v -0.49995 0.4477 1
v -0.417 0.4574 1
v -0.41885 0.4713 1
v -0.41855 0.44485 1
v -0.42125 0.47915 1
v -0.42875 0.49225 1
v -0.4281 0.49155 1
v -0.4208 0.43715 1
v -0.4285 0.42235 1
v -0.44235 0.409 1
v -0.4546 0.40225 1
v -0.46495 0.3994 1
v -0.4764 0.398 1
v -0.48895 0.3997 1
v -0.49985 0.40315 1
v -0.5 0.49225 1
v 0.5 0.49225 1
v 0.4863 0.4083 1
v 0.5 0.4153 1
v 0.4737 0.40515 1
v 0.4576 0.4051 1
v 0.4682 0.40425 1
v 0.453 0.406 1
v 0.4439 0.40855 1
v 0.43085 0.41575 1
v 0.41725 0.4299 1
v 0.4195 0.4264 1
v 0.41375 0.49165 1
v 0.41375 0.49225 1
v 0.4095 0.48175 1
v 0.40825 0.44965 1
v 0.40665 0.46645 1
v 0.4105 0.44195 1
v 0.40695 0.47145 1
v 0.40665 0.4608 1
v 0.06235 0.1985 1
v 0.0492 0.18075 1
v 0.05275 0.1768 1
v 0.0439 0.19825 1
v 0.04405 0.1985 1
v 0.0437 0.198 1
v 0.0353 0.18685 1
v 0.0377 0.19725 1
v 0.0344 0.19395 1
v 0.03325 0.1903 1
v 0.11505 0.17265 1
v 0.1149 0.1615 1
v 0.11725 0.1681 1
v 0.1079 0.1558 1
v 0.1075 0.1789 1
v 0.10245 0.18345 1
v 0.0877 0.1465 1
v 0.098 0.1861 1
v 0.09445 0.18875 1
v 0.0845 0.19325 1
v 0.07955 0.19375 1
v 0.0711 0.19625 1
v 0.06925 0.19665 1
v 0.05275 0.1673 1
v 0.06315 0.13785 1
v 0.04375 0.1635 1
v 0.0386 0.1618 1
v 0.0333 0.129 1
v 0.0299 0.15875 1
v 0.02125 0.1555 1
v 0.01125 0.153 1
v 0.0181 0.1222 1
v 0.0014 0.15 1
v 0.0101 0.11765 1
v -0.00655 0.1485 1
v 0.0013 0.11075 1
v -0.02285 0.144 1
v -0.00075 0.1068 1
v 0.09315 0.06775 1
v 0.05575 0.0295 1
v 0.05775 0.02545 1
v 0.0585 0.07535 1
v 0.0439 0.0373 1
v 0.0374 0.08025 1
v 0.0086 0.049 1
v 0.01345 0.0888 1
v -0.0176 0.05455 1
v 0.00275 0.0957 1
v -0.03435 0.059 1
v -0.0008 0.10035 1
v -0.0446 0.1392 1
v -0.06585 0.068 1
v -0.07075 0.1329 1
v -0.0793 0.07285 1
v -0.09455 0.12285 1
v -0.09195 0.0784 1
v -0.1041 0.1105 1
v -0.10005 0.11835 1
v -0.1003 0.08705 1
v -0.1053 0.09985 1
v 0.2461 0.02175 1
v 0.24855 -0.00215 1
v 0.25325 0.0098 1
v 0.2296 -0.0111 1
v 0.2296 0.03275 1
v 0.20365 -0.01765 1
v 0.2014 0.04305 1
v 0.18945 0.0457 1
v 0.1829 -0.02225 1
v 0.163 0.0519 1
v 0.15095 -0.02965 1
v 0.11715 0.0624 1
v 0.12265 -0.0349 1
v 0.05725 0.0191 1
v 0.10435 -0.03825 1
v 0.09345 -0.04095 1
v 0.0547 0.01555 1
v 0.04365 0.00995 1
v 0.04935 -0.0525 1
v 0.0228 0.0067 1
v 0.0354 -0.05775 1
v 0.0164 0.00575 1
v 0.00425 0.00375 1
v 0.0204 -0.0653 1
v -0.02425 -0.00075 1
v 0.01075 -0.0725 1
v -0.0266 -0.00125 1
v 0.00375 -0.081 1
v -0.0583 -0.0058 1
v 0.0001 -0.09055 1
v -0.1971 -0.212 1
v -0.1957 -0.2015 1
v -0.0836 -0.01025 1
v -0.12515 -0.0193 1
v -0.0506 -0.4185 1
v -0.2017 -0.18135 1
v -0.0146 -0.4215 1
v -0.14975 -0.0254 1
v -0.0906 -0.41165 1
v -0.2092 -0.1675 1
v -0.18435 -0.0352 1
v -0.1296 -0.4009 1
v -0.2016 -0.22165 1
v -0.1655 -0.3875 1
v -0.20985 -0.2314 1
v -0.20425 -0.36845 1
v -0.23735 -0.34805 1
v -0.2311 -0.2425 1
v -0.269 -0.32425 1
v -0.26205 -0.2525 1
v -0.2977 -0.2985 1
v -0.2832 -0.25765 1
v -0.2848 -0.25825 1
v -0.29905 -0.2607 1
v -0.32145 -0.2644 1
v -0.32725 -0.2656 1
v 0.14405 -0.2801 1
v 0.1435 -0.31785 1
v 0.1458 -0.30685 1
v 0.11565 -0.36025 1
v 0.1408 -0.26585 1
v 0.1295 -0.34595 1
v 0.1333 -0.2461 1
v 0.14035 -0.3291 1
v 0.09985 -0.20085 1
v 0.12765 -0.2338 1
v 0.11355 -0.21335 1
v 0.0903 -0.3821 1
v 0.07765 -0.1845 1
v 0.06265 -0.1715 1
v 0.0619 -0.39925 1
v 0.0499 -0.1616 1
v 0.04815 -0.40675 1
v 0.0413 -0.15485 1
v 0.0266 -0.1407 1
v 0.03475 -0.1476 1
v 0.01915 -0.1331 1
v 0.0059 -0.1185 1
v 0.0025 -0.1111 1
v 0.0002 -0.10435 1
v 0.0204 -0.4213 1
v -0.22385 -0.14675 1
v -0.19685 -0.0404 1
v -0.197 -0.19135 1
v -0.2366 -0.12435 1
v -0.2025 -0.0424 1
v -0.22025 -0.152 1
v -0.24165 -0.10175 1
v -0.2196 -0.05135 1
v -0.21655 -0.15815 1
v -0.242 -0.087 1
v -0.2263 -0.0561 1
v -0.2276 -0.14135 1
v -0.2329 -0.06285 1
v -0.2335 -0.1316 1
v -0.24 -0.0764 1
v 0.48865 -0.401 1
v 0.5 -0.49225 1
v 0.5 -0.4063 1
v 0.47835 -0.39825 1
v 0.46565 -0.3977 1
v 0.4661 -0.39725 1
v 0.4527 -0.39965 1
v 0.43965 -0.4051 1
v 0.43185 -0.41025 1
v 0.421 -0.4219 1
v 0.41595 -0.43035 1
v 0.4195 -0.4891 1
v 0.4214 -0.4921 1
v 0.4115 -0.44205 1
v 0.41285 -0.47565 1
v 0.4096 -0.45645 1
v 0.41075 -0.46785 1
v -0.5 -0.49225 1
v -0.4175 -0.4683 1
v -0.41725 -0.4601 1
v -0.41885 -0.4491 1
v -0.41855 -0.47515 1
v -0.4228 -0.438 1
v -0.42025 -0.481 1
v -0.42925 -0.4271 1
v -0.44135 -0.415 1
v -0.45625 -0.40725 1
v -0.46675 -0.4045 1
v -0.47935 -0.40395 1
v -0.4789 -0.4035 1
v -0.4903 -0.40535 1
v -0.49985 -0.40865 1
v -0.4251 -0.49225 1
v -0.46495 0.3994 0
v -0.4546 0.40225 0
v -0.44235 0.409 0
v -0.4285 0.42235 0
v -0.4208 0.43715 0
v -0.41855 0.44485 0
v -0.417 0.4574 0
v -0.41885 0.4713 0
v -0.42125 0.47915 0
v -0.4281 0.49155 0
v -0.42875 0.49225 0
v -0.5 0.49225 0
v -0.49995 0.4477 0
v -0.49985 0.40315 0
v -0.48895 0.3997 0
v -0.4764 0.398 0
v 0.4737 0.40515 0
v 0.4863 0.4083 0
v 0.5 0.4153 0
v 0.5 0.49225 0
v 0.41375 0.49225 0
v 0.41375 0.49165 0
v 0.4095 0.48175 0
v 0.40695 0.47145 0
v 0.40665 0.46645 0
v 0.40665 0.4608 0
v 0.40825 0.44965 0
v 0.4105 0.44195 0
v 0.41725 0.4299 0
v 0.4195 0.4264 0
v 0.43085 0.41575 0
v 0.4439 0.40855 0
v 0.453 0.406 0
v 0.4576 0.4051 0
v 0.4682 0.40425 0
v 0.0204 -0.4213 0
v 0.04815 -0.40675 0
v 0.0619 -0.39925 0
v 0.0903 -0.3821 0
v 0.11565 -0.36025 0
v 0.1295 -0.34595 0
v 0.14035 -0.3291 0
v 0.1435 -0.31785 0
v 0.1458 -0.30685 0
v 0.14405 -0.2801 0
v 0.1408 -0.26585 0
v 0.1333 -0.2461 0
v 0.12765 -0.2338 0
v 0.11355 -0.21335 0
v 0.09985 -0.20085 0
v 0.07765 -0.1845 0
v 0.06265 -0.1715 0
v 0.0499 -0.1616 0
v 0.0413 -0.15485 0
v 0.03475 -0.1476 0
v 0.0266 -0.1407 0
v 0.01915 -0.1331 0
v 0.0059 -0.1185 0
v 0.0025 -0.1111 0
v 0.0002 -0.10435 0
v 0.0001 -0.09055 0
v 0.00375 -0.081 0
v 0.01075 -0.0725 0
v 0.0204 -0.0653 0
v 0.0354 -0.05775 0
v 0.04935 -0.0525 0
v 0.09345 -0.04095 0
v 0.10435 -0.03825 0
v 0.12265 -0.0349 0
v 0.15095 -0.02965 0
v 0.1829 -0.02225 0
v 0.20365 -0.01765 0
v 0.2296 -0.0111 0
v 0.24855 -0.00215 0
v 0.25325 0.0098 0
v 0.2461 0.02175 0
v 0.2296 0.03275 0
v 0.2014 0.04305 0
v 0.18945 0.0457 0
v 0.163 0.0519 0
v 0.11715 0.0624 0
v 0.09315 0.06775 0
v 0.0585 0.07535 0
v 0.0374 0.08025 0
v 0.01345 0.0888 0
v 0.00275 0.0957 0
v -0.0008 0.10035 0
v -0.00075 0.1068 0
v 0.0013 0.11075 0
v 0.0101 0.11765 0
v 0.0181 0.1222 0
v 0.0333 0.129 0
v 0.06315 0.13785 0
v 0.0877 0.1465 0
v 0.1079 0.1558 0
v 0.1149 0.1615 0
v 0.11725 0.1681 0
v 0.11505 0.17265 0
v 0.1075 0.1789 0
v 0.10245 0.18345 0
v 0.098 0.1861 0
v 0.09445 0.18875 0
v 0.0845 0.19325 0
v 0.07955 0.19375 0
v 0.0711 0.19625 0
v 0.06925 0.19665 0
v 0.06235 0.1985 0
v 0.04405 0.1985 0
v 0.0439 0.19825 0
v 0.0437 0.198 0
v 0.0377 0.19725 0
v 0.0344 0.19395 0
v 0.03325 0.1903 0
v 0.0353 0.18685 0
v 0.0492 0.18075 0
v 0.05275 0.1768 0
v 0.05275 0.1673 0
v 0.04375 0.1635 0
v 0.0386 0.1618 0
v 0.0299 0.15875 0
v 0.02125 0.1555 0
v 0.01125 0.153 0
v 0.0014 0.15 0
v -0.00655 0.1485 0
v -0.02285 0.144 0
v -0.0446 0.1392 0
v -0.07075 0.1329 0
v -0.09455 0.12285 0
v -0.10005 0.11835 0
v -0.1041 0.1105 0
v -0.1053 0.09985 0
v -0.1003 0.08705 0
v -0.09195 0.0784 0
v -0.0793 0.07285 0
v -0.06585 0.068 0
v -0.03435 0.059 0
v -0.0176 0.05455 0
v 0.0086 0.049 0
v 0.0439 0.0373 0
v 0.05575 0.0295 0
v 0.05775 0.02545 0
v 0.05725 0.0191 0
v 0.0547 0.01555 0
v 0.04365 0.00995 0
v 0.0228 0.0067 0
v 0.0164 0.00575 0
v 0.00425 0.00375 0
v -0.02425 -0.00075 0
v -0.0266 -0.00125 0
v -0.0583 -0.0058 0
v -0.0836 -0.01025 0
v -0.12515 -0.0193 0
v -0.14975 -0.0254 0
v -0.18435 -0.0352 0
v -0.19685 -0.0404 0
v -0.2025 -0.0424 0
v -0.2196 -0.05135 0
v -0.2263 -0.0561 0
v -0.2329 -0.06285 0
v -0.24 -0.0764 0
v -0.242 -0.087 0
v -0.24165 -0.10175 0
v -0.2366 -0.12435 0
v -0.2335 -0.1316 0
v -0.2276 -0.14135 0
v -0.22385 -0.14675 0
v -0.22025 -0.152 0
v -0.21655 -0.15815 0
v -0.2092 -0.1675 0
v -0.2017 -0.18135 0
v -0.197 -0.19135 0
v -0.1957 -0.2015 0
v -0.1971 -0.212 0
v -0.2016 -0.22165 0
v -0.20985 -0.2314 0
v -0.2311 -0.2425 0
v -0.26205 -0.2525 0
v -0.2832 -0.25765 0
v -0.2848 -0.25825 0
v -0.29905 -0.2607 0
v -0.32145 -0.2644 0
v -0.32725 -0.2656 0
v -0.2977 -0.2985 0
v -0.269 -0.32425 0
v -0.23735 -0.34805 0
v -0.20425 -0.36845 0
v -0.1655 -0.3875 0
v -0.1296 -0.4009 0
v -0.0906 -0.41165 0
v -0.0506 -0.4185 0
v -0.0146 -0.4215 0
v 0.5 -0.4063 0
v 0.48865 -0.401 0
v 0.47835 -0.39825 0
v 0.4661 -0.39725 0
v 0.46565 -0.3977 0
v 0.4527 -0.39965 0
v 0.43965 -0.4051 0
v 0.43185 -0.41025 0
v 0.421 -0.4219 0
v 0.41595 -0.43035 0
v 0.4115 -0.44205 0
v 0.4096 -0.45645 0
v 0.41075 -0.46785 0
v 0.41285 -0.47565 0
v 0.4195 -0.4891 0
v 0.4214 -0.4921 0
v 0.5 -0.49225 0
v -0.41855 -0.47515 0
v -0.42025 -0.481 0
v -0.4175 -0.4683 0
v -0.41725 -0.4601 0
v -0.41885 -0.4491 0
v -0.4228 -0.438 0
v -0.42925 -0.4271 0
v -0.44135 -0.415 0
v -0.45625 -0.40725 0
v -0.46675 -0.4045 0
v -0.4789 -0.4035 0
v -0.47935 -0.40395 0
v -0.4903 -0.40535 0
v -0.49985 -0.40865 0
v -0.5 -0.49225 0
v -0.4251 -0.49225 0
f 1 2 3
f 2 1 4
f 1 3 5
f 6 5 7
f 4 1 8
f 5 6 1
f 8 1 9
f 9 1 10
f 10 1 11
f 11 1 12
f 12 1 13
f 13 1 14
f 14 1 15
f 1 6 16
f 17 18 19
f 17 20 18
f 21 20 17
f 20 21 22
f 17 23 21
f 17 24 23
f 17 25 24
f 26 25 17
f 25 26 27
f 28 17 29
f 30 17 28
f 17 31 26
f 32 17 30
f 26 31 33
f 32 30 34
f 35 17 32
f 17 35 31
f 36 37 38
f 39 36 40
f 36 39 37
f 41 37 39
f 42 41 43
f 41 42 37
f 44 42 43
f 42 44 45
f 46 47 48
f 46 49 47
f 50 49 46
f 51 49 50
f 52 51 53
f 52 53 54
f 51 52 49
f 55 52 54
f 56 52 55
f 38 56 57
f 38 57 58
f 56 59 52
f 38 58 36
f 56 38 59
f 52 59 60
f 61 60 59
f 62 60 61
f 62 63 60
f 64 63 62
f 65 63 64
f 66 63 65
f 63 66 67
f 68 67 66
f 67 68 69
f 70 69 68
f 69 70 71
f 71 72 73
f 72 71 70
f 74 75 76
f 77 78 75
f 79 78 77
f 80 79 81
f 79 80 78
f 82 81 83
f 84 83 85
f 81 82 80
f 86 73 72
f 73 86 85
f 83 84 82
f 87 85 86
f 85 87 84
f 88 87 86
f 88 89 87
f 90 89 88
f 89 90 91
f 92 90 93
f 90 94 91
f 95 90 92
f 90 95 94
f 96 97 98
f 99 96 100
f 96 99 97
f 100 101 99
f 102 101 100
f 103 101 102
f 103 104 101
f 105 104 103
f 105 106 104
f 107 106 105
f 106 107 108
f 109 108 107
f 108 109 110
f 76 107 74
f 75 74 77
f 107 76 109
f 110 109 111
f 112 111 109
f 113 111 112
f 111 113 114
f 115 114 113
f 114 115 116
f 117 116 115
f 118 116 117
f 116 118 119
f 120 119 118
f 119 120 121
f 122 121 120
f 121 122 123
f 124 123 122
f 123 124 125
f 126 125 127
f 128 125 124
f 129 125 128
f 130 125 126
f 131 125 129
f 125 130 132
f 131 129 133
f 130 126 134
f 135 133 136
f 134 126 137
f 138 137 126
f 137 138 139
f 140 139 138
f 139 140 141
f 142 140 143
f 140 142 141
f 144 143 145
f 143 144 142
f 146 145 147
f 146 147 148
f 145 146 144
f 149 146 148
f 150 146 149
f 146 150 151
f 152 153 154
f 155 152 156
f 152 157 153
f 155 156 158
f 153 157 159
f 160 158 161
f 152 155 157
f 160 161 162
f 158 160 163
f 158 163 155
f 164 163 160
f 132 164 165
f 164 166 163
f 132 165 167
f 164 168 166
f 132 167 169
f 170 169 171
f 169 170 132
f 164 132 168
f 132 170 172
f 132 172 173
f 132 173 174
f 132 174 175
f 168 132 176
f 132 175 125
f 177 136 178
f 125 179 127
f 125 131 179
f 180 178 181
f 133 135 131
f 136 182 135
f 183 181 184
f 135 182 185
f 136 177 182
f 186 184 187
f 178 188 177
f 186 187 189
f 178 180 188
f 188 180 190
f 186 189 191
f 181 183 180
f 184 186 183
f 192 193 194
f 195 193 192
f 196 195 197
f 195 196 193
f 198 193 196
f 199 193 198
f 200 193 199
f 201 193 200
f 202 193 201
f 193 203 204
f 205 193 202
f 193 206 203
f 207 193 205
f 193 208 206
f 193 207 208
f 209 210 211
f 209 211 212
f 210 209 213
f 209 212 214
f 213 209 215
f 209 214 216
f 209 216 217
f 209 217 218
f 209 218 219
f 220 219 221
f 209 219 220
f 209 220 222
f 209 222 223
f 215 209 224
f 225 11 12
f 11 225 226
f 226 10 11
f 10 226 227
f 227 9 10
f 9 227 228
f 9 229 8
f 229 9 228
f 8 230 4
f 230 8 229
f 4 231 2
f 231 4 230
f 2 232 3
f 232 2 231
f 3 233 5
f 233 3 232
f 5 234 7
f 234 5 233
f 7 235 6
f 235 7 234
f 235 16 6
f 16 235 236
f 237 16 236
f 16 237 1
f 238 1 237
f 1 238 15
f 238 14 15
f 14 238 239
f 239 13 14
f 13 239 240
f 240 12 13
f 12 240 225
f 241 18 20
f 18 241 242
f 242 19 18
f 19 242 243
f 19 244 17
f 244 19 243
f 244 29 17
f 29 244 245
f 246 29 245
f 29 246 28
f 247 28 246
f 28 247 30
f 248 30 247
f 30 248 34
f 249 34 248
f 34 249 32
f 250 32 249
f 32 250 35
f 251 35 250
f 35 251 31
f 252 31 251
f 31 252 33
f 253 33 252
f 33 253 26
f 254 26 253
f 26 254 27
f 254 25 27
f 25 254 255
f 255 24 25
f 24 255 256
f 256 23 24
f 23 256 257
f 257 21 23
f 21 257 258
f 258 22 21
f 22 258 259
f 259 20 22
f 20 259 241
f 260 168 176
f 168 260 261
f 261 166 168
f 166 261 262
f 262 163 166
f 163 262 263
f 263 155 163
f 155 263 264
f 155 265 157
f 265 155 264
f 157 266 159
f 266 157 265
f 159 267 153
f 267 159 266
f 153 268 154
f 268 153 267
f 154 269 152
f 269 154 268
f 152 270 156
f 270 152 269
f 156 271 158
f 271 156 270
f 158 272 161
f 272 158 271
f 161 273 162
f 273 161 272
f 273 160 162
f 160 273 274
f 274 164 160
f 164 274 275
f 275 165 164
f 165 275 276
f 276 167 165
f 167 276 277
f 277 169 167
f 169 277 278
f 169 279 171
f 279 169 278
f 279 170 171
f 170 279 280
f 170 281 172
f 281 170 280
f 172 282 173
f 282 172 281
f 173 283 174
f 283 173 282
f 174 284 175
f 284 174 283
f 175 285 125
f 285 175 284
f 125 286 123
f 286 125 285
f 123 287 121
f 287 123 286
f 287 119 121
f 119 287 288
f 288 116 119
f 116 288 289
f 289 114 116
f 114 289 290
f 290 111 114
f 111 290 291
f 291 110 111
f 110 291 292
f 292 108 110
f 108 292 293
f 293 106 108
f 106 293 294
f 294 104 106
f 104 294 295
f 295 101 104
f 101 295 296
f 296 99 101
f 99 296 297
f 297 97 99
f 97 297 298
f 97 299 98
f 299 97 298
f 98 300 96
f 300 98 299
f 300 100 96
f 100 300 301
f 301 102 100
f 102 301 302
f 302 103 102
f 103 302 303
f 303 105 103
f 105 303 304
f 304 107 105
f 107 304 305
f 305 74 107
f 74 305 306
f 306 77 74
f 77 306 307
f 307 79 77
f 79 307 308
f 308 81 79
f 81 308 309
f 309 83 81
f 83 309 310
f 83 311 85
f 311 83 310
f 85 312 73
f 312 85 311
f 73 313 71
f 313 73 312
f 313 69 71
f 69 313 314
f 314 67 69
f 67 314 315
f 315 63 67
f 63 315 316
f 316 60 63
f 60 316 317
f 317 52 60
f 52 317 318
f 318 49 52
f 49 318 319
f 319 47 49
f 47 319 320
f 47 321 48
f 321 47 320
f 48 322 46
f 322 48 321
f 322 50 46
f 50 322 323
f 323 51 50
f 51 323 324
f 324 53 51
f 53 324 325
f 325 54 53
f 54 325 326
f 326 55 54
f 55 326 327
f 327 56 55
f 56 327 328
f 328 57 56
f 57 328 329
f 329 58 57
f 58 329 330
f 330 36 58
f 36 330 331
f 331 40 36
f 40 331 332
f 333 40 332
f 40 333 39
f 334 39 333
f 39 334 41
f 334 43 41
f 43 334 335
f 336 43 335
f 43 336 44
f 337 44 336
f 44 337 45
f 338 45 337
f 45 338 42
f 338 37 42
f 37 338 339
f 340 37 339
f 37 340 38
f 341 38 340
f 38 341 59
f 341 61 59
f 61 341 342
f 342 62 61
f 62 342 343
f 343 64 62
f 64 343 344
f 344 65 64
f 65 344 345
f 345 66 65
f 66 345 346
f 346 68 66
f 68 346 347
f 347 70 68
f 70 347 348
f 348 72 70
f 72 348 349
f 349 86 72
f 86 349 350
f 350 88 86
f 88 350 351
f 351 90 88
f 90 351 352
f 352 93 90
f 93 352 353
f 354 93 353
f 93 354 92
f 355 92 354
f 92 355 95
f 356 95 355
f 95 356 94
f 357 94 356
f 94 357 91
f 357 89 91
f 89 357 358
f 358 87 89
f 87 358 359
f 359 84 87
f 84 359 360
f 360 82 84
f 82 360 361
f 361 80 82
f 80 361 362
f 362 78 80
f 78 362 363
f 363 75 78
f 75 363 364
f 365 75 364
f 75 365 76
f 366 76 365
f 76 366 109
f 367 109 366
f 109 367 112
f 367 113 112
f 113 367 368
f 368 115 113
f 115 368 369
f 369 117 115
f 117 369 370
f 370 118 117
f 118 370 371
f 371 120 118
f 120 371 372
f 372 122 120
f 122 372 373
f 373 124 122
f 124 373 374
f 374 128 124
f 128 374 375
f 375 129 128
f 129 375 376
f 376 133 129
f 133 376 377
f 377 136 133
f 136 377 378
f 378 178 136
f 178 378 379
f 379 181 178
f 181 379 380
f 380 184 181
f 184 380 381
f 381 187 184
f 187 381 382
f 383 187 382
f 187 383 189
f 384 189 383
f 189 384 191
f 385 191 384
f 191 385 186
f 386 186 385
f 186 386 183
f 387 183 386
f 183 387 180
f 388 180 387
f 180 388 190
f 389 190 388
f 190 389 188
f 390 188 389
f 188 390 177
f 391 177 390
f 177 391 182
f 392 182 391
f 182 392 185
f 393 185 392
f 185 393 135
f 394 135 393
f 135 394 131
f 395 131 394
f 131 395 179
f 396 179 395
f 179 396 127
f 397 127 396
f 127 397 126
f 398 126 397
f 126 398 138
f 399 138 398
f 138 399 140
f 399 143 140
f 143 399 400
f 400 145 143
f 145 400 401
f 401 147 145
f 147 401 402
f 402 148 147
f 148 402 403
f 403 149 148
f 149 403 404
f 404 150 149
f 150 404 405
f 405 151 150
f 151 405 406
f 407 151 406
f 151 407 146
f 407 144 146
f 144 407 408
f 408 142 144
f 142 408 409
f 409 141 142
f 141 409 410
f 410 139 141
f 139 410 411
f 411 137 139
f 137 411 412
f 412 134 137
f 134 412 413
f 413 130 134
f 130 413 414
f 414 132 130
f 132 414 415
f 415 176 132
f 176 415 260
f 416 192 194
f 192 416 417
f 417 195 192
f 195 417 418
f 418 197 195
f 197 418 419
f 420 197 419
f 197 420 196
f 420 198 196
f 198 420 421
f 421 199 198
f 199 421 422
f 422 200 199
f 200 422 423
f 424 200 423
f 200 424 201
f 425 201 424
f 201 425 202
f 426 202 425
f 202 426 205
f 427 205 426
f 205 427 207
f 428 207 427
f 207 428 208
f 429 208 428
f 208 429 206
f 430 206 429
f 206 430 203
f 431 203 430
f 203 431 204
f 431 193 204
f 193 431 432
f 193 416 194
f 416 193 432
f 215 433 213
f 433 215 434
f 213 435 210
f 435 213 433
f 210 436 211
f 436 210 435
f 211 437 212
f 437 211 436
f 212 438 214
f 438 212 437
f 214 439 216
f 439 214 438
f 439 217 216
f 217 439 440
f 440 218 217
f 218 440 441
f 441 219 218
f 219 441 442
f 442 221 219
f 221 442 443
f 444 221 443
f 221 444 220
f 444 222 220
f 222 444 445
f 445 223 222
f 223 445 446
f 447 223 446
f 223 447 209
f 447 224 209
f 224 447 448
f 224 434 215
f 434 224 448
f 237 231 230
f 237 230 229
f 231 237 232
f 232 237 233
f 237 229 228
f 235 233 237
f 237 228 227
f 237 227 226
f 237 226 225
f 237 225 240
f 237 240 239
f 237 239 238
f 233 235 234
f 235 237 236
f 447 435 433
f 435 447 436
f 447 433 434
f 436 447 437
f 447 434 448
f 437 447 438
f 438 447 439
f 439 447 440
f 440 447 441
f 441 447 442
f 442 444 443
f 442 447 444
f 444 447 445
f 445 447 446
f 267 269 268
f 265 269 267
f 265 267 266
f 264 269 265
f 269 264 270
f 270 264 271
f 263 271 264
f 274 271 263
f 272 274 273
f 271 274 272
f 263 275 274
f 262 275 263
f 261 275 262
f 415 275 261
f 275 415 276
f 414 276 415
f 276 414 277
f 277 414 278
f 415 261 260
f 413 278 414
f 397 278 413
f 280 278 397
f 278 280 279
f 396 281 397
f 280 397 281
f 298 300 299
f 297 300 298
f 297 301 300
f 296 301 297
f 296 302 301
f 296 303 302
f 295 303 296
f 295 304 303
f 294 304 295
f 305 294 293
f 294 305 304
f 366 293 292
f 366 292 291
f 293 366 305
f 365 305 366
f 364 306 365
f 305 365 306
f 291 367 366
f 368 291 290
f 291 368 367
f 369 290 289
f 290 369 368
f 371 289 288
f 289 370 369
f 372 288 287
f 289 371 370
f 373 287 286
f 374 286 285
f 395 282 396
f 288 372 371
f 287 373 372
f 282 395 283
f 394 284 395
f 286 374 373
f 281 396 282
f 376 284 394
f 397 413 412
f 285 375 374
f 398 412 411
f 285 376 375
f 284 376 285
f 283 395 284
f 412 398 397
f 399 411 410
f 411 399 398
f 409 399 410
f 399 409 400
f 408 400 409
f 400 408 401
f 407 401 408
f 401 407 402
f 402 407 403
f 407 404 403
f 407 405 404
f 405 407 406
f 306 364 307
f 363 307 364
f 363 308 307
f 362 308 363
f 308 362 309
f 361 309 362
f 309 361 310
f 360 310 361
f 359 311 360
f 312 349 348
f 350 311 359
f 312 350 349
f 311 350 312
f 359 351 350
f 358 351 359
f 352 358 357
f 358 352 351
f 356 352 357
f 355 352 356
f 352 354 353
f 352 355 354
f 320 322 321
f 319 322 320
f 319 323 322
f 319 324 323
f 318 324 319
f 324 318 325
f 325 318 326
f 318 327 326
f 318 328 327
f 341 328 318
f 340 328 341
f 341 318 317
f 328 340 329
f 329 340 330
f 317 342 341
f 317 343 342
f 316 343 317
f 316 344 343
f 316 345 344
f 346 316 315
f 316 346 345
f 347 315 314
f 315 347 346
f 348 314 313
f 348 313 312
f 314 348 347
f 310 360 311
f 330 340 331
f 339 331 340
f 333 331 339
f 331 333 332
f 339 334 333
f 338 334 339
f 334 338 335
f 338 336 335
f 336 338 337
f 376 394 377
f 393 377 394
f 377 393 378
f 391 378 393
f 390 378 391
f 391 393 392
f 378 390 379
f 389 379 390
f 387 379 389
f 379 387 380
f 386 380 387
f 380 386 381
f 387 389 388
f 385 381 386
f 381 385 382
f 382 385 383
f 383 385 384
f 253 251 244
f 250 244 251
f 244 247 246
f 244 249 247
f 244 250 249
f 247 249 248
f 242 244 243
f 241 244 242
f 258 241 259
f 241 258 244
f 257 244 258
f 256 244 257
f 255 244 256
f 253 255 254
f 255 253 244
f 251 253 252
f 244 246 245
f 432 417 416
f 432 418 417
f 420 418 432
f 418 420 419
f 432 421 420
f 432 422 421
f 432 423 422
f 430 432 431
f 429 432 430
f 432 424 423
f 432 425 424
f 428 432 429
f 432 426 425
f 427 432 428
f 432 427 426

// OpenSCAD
module C3purple_1()
{
 /* Generated by trace2scad version 20150415
    http://aggregate.org/MAKE/TRACE2SCAD/
    Optimized model has 227/2747 original points
 */
 color([0.5, 0.5, 0.5])
 assign(minx=0) /* polygon minx=0 */
 assign(miny=0) /* polygon miny=0 */
 assign(maxx=20000) /* polygon maxx=20000 */
 assign(maxy=19690) /* polygon maxy=19690 */
 assign(dx=maxx-minx)
 assign(dy=maxy-miny)
 assign(maxd=((dx>dy)?dx:dy))
 scale([1/maxd, 1/maxd, 1])
 translate([-minx-dx/2, -miny-dy/2, 0])
 linear_extrude(height=1, convexity=227)
 union() {
  union() {
   polygon([[1,18799],[3,17908],[221,17839],[472,17805],[701,17833],[908,17890],[1153,18025],[1430,18292],[1584,18588],[1629,18742],[1660,18993],[1623,19271],[1575,19428],[1438,19676],[1425,19690],[0,19690]], convexity=5);
   polygon([[18275,19684],[18275,19678],[18190,19480],[18139,19274],[18133,19174],[18133,19061],[18165,18838],[18210,18684],[18345,18443],[18390,18373],[18617,18160],[18878,18016],[19060,17965],[19152,17947],[19364,17930],[19474,17948],[19726,18011],[20000,18151],[20000,19690],[18275,19690]], convexity=7);
   polygon([[10878,13810],[10874,13805],[10754,13790],[10688,13724],[10665,13651],[10706,13582],[10984,13460],[11055,13381],[11055,13191],[10875,13115],[10772,13081],[10598,13020],[10425,12955],[10225,12905],[10028,12845],[9869,12815],[9543,12725],[9108,12629],[8585,12503],[8109,12302],[7999,12212],[7918,12055],[7894,11842],[7994,11586],[8161,11413],[8414,11302],[8683,11205],[9313,11025],[9648,10936],[10172,10825],[10878,10591],[11115,10435],[11155,10354],[11145,10227],[11094,10156],[10873,10044],[10456,9979],[10328,9960],[10085,9920],[9515,9830],[9468,9820],[8834,9729],[8328,9640],[7497,9459],[7005,9337],[6313,9141],[6063,9037],[5950,8997],[5608,8818],[5474,8723],[5342,8588],[5200,8317],[5160,8105],[5167,7810],[5268,7358],[5330,7213],[5448,7018],[5523,6910],[5595,6805],[5669,6682],[5816,6495],[5966,6218],[6060,6018],[6086,5815],[6058,5605],[5968,5412],[5803,5217],[5378,4995],[4759,4795],[4336,4692],[4304,4680],[4019,4631],[3571,4557],[3455,4533],[4046,3875],[4620,3360],[5253,2884],[5915,2476],[6690,2095],[7408,1827],[8188,1612],[8988,1475],[9708,1415],[10408,1419],[10963,1710],[11238,1860],[11806,2203],[12313,2640],[12590,2926],[12807,3263],[12870,3488],[12916,3708],[12881,4243],[12816,4528],[12666,4923],[12553,5169],[12271,5578],[11997,5828],[11553,6155],[11253,6415],[10998,6613],[10826,6748],[10695,6893],[10532,7031],[10383,7183],[10118,7475],[10050,7623],[10004,7758],[10002,8034],[10075,8225],[10215,8395],[10408,8539],[10708,8690],[10987,8795],[11869,9026],[12087,9080],[12453,9147],[13019,9252],[13658,9400],[14073,9492],[14592,9623],[14971,9802],[15065,10041],[14922,10280],[14592,10500],[14028,10706],[13789,10759],[13260,10883],[12343,11093],[11863,11200],[11170,11352],[10748,11450],[10269,11621],[10055,11759],[9984,11852],[9985,11981],[10026,12060],[10202,12198],[10362,12289],[10666,12425],[11263,12602],[11754,12775],[12158,12961],[12298,13075],[12345,13207],[12301,13298],[12150,13423],[12049,13514],[11960,13567],[11889,13620],[11690,13710],[11591,13720],[11422,13770],[11385,13778],[11247,13815],[10881,13815]], convexity=16);
   polygon([[19317,1895],[19313,1891],[19054,1852],[18793,1743],[18637,1640],[18420,1407],[18319,1238],[18230,1004],[18192,716],[18215,488],[18257,332],[18390,63],[18428,3],[20000,0],[20000,1719],[19773,1825],[19567,1880],[19322,1900]], convexity=6);
   polygon([[417,1770],[413,1766],[194,1738],[3,1672],[0,0],[1498,0],[1595,225],[1629,342],[1650,479],[1655,643],[1623,863],[1544,1085],[1415,1303],[1173,1545],[875,1700],[665,1755],[422,1775]], convexity=5);
  }
 }
}

module C3purple()
{
 /* all layers combined, scaled to within a 1mm cube */
 scale([1, 1, 1/1])
 difference() {
  union() {
   scale([1,1,2]) translate([0,0,-0.5]) C3purple_1();
  }
  translate([0,0,-2]) cube([2,2,4],center=true);
 }
}
C3purple();
